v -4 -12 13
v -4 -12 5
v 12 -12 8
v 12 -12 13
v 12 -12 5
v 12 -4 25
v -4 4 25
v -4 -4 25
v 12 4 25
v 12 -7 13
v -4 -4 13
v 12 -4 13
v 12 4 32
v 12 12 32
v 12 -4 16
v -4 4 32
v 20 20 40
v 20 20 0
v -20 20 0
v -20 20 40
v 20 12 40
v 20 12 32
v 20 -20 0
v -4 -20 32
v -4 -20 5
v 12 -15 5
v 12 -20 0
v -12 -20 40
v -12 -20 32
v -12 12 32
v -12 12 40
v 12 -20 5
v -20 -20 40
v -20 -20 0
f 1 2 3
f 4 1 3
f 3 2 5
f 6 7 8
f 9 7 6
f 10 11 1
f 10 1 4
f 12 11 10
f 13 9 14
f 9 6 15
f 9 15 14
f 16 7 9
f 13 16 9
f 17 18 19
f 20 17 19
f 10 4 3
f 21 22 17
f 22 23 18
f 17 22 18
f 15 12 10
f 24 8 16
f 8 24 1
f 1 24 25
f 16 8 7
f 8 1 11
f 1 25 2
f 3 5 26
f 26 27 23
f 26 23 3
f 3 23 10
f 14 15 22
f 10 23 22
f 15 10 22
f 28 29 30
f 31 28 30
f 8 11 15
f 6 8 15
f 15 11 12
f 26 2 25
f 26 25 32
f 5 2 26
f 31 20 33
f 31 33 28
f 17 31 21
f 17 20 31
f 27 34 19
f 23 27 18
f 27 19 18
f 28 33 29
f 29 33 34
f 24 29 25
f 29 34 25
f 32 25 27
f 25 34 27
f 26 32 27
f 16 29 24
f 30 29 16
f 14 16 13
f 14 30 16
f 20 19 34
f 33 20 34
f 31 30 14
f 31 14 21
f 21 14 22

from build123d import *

# Parameters (mm, degrees)
F1_DEPTH = 32
F3_DEPTH = 25
F4_DEPTH = 40
F5_DEPTH = 32
F0_W     = 16
F0_H     = 8
F6_DEPTH = 25
F7_DEPTH = 13
F8_DEPTH = 5


with BuildPart() as f1:
    # F0 (on Top) → F1 (new body)
    with BuildSketch(Plane.XY):
        Polygon((12, -20), (20, -20), (20, 12), (12, 12), (12, 4), (12, -4), (12, -12), align=None)
    extrude(amount=F1_DEPTH)

    # F2 (on face) → F3 (cut)
    with BuildSketch(Plane.YZ.offset(20)):
        Polygon((-20, 0), (12, 32), (-20, 32), align=None)
    extrude(amount=-F3_DEPTH, mode=Mode.SUBTRACT)

    # F0 (on Top) → F4 (join)
    with BuildSketch(Plane.XY):
        Polygon((12, 12), (20, 12), (20, 20), (-12, 20), (-20, 20), (-20, -20), (-12, -20), (-12, 12), align=None)
    extrude(amount=F4_DEPTH)

    # F0 (on Top) → F5 (join)
    with BuildSketch(Plane.XY):
        Polygon((-12, -20), (-4, -20), (-4, -12), (-4, -4), (-4, 4), (12, 4), (12, 12), (-12, 12), align=None)
    extrude(amount=F5_DEPTH)

    # F0 (on Top) → F6 (join)
    with BuildSketch(Plane.XY):
        with Locations((4, 0)):
            Rectangle(F0_W, F0_H)
    extrude(amount=F6_DEPTH)

    # F0 (on Top) → F7 (join)
    with BuildSketch(Plane.XY):
        with Locations((4, -8)):
            Rectangle(F0_W, F0_H)
    extrude(amount=F7_DEPTH)

    # F0 (on Top) → F8 (join)
    with BuildSketch(Plane.XY):
        with Locations((4, -16)):
            Rectangle(F0_W, F0_H)
    extrude(amount=F8_DEPTH)


solid = f1.part
